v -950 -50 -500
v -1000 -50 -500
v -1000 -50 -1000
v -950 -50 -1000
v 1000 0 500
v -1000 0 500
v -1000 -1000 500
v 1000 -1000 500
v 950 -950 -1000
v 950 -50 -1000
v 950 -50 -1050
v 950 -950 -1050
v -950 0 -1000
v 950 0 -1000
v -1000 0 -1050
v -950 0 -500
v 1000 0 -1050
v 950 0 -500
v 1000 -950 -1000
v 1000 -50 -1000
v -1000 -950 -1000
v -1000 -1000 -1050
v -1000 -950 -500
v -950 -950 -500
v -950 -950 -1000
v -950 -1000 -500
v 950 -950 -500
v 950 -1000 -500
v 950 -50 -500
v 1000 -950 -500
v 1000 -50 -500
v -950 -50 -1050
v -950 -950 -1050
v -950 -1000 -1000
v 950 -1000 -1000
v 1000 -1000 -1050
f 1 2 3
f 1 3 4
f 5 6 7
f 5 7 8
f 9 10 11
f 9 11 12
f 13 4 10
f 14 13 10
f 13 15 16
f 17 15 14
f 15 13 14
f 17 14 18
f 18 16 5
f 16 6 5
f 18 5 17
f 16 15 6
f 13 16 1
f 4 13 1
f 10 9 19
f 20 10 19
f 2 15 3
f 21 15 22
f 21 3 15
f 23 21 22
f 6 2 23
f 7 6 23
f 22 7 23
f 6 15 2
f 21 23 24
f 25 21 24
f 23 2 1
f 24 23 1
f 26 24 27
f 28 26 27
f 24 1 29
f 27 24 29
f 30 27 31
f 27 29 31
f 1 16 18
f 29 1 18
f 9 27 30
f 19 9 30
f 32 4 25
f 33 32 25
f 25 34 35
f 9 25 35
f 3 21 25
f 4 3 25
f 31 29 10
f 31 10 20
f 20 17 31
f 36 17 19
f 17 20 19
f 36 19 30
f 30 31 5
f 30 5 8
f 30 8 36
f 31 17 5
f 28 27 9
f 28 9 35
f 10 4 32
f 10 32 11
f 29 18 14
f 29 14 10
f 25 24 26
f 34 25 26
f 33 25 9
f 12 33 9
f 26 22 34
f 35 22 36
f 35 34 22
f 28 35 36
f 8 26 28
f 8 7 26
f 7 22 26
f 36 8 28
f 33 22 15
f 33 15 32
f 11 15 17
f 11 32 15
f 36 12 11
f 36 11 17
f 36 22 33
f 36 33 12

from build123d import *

# Parameters (mm, degrees)
F0_W     = 2000
F0_H     = 1000
F1_DEPTH = 1000
F3_W     = 50
F3_H     = 50
F4_DEPTH = 500
F6_W     = 2000
F6_H     = 1000
F6_W_2   = 1900
F6_H_2   = 900
F7_DEPTH = 50


with BuildPart() as f1:
    # F0 (on Front) → F1 (new body)
    with BuildSketch(Plane.XZ):
        Rectangle(F0_W, F0_H)
    extrude(amount=F1_DEPTH)

    # F3 (on offset) → F4 (join)
    with BuildSketch(Plane(origin=(0, 0, -500), x_dir=(1, 0, 0), z_dir=(0, 0, -1))):
        with Locations((975, 25)):
            Rectangle(F3_W, F3_H)
        with Locations((975, 975)):
            Rectangle(F3_W, F3_H)
        with Locations((-975, 975)):
            Rectangle(F3_W, F3_H)
        with Locations((-975, 25)):
            Rectangle(F3_W, F3_H)
    extrude(amount=F4_DEPTH)

    # F6 (on offset) → F7 (join)
    with BuildSketch(Plane(origin=(0, 0, -1000), x_dir=(1, 0, 0), z_dir=(0, 0, -1))):
        with Locations((0, 500)):
            Rectangle(F6_W, F6_H)
        with Locations((0, 500)):
            Rectangle(F6_W_2, F6_H_2, mode=Mode.SUBTRACT)
    extrude(amount=F7_DEPTH)


solid = f1.part
